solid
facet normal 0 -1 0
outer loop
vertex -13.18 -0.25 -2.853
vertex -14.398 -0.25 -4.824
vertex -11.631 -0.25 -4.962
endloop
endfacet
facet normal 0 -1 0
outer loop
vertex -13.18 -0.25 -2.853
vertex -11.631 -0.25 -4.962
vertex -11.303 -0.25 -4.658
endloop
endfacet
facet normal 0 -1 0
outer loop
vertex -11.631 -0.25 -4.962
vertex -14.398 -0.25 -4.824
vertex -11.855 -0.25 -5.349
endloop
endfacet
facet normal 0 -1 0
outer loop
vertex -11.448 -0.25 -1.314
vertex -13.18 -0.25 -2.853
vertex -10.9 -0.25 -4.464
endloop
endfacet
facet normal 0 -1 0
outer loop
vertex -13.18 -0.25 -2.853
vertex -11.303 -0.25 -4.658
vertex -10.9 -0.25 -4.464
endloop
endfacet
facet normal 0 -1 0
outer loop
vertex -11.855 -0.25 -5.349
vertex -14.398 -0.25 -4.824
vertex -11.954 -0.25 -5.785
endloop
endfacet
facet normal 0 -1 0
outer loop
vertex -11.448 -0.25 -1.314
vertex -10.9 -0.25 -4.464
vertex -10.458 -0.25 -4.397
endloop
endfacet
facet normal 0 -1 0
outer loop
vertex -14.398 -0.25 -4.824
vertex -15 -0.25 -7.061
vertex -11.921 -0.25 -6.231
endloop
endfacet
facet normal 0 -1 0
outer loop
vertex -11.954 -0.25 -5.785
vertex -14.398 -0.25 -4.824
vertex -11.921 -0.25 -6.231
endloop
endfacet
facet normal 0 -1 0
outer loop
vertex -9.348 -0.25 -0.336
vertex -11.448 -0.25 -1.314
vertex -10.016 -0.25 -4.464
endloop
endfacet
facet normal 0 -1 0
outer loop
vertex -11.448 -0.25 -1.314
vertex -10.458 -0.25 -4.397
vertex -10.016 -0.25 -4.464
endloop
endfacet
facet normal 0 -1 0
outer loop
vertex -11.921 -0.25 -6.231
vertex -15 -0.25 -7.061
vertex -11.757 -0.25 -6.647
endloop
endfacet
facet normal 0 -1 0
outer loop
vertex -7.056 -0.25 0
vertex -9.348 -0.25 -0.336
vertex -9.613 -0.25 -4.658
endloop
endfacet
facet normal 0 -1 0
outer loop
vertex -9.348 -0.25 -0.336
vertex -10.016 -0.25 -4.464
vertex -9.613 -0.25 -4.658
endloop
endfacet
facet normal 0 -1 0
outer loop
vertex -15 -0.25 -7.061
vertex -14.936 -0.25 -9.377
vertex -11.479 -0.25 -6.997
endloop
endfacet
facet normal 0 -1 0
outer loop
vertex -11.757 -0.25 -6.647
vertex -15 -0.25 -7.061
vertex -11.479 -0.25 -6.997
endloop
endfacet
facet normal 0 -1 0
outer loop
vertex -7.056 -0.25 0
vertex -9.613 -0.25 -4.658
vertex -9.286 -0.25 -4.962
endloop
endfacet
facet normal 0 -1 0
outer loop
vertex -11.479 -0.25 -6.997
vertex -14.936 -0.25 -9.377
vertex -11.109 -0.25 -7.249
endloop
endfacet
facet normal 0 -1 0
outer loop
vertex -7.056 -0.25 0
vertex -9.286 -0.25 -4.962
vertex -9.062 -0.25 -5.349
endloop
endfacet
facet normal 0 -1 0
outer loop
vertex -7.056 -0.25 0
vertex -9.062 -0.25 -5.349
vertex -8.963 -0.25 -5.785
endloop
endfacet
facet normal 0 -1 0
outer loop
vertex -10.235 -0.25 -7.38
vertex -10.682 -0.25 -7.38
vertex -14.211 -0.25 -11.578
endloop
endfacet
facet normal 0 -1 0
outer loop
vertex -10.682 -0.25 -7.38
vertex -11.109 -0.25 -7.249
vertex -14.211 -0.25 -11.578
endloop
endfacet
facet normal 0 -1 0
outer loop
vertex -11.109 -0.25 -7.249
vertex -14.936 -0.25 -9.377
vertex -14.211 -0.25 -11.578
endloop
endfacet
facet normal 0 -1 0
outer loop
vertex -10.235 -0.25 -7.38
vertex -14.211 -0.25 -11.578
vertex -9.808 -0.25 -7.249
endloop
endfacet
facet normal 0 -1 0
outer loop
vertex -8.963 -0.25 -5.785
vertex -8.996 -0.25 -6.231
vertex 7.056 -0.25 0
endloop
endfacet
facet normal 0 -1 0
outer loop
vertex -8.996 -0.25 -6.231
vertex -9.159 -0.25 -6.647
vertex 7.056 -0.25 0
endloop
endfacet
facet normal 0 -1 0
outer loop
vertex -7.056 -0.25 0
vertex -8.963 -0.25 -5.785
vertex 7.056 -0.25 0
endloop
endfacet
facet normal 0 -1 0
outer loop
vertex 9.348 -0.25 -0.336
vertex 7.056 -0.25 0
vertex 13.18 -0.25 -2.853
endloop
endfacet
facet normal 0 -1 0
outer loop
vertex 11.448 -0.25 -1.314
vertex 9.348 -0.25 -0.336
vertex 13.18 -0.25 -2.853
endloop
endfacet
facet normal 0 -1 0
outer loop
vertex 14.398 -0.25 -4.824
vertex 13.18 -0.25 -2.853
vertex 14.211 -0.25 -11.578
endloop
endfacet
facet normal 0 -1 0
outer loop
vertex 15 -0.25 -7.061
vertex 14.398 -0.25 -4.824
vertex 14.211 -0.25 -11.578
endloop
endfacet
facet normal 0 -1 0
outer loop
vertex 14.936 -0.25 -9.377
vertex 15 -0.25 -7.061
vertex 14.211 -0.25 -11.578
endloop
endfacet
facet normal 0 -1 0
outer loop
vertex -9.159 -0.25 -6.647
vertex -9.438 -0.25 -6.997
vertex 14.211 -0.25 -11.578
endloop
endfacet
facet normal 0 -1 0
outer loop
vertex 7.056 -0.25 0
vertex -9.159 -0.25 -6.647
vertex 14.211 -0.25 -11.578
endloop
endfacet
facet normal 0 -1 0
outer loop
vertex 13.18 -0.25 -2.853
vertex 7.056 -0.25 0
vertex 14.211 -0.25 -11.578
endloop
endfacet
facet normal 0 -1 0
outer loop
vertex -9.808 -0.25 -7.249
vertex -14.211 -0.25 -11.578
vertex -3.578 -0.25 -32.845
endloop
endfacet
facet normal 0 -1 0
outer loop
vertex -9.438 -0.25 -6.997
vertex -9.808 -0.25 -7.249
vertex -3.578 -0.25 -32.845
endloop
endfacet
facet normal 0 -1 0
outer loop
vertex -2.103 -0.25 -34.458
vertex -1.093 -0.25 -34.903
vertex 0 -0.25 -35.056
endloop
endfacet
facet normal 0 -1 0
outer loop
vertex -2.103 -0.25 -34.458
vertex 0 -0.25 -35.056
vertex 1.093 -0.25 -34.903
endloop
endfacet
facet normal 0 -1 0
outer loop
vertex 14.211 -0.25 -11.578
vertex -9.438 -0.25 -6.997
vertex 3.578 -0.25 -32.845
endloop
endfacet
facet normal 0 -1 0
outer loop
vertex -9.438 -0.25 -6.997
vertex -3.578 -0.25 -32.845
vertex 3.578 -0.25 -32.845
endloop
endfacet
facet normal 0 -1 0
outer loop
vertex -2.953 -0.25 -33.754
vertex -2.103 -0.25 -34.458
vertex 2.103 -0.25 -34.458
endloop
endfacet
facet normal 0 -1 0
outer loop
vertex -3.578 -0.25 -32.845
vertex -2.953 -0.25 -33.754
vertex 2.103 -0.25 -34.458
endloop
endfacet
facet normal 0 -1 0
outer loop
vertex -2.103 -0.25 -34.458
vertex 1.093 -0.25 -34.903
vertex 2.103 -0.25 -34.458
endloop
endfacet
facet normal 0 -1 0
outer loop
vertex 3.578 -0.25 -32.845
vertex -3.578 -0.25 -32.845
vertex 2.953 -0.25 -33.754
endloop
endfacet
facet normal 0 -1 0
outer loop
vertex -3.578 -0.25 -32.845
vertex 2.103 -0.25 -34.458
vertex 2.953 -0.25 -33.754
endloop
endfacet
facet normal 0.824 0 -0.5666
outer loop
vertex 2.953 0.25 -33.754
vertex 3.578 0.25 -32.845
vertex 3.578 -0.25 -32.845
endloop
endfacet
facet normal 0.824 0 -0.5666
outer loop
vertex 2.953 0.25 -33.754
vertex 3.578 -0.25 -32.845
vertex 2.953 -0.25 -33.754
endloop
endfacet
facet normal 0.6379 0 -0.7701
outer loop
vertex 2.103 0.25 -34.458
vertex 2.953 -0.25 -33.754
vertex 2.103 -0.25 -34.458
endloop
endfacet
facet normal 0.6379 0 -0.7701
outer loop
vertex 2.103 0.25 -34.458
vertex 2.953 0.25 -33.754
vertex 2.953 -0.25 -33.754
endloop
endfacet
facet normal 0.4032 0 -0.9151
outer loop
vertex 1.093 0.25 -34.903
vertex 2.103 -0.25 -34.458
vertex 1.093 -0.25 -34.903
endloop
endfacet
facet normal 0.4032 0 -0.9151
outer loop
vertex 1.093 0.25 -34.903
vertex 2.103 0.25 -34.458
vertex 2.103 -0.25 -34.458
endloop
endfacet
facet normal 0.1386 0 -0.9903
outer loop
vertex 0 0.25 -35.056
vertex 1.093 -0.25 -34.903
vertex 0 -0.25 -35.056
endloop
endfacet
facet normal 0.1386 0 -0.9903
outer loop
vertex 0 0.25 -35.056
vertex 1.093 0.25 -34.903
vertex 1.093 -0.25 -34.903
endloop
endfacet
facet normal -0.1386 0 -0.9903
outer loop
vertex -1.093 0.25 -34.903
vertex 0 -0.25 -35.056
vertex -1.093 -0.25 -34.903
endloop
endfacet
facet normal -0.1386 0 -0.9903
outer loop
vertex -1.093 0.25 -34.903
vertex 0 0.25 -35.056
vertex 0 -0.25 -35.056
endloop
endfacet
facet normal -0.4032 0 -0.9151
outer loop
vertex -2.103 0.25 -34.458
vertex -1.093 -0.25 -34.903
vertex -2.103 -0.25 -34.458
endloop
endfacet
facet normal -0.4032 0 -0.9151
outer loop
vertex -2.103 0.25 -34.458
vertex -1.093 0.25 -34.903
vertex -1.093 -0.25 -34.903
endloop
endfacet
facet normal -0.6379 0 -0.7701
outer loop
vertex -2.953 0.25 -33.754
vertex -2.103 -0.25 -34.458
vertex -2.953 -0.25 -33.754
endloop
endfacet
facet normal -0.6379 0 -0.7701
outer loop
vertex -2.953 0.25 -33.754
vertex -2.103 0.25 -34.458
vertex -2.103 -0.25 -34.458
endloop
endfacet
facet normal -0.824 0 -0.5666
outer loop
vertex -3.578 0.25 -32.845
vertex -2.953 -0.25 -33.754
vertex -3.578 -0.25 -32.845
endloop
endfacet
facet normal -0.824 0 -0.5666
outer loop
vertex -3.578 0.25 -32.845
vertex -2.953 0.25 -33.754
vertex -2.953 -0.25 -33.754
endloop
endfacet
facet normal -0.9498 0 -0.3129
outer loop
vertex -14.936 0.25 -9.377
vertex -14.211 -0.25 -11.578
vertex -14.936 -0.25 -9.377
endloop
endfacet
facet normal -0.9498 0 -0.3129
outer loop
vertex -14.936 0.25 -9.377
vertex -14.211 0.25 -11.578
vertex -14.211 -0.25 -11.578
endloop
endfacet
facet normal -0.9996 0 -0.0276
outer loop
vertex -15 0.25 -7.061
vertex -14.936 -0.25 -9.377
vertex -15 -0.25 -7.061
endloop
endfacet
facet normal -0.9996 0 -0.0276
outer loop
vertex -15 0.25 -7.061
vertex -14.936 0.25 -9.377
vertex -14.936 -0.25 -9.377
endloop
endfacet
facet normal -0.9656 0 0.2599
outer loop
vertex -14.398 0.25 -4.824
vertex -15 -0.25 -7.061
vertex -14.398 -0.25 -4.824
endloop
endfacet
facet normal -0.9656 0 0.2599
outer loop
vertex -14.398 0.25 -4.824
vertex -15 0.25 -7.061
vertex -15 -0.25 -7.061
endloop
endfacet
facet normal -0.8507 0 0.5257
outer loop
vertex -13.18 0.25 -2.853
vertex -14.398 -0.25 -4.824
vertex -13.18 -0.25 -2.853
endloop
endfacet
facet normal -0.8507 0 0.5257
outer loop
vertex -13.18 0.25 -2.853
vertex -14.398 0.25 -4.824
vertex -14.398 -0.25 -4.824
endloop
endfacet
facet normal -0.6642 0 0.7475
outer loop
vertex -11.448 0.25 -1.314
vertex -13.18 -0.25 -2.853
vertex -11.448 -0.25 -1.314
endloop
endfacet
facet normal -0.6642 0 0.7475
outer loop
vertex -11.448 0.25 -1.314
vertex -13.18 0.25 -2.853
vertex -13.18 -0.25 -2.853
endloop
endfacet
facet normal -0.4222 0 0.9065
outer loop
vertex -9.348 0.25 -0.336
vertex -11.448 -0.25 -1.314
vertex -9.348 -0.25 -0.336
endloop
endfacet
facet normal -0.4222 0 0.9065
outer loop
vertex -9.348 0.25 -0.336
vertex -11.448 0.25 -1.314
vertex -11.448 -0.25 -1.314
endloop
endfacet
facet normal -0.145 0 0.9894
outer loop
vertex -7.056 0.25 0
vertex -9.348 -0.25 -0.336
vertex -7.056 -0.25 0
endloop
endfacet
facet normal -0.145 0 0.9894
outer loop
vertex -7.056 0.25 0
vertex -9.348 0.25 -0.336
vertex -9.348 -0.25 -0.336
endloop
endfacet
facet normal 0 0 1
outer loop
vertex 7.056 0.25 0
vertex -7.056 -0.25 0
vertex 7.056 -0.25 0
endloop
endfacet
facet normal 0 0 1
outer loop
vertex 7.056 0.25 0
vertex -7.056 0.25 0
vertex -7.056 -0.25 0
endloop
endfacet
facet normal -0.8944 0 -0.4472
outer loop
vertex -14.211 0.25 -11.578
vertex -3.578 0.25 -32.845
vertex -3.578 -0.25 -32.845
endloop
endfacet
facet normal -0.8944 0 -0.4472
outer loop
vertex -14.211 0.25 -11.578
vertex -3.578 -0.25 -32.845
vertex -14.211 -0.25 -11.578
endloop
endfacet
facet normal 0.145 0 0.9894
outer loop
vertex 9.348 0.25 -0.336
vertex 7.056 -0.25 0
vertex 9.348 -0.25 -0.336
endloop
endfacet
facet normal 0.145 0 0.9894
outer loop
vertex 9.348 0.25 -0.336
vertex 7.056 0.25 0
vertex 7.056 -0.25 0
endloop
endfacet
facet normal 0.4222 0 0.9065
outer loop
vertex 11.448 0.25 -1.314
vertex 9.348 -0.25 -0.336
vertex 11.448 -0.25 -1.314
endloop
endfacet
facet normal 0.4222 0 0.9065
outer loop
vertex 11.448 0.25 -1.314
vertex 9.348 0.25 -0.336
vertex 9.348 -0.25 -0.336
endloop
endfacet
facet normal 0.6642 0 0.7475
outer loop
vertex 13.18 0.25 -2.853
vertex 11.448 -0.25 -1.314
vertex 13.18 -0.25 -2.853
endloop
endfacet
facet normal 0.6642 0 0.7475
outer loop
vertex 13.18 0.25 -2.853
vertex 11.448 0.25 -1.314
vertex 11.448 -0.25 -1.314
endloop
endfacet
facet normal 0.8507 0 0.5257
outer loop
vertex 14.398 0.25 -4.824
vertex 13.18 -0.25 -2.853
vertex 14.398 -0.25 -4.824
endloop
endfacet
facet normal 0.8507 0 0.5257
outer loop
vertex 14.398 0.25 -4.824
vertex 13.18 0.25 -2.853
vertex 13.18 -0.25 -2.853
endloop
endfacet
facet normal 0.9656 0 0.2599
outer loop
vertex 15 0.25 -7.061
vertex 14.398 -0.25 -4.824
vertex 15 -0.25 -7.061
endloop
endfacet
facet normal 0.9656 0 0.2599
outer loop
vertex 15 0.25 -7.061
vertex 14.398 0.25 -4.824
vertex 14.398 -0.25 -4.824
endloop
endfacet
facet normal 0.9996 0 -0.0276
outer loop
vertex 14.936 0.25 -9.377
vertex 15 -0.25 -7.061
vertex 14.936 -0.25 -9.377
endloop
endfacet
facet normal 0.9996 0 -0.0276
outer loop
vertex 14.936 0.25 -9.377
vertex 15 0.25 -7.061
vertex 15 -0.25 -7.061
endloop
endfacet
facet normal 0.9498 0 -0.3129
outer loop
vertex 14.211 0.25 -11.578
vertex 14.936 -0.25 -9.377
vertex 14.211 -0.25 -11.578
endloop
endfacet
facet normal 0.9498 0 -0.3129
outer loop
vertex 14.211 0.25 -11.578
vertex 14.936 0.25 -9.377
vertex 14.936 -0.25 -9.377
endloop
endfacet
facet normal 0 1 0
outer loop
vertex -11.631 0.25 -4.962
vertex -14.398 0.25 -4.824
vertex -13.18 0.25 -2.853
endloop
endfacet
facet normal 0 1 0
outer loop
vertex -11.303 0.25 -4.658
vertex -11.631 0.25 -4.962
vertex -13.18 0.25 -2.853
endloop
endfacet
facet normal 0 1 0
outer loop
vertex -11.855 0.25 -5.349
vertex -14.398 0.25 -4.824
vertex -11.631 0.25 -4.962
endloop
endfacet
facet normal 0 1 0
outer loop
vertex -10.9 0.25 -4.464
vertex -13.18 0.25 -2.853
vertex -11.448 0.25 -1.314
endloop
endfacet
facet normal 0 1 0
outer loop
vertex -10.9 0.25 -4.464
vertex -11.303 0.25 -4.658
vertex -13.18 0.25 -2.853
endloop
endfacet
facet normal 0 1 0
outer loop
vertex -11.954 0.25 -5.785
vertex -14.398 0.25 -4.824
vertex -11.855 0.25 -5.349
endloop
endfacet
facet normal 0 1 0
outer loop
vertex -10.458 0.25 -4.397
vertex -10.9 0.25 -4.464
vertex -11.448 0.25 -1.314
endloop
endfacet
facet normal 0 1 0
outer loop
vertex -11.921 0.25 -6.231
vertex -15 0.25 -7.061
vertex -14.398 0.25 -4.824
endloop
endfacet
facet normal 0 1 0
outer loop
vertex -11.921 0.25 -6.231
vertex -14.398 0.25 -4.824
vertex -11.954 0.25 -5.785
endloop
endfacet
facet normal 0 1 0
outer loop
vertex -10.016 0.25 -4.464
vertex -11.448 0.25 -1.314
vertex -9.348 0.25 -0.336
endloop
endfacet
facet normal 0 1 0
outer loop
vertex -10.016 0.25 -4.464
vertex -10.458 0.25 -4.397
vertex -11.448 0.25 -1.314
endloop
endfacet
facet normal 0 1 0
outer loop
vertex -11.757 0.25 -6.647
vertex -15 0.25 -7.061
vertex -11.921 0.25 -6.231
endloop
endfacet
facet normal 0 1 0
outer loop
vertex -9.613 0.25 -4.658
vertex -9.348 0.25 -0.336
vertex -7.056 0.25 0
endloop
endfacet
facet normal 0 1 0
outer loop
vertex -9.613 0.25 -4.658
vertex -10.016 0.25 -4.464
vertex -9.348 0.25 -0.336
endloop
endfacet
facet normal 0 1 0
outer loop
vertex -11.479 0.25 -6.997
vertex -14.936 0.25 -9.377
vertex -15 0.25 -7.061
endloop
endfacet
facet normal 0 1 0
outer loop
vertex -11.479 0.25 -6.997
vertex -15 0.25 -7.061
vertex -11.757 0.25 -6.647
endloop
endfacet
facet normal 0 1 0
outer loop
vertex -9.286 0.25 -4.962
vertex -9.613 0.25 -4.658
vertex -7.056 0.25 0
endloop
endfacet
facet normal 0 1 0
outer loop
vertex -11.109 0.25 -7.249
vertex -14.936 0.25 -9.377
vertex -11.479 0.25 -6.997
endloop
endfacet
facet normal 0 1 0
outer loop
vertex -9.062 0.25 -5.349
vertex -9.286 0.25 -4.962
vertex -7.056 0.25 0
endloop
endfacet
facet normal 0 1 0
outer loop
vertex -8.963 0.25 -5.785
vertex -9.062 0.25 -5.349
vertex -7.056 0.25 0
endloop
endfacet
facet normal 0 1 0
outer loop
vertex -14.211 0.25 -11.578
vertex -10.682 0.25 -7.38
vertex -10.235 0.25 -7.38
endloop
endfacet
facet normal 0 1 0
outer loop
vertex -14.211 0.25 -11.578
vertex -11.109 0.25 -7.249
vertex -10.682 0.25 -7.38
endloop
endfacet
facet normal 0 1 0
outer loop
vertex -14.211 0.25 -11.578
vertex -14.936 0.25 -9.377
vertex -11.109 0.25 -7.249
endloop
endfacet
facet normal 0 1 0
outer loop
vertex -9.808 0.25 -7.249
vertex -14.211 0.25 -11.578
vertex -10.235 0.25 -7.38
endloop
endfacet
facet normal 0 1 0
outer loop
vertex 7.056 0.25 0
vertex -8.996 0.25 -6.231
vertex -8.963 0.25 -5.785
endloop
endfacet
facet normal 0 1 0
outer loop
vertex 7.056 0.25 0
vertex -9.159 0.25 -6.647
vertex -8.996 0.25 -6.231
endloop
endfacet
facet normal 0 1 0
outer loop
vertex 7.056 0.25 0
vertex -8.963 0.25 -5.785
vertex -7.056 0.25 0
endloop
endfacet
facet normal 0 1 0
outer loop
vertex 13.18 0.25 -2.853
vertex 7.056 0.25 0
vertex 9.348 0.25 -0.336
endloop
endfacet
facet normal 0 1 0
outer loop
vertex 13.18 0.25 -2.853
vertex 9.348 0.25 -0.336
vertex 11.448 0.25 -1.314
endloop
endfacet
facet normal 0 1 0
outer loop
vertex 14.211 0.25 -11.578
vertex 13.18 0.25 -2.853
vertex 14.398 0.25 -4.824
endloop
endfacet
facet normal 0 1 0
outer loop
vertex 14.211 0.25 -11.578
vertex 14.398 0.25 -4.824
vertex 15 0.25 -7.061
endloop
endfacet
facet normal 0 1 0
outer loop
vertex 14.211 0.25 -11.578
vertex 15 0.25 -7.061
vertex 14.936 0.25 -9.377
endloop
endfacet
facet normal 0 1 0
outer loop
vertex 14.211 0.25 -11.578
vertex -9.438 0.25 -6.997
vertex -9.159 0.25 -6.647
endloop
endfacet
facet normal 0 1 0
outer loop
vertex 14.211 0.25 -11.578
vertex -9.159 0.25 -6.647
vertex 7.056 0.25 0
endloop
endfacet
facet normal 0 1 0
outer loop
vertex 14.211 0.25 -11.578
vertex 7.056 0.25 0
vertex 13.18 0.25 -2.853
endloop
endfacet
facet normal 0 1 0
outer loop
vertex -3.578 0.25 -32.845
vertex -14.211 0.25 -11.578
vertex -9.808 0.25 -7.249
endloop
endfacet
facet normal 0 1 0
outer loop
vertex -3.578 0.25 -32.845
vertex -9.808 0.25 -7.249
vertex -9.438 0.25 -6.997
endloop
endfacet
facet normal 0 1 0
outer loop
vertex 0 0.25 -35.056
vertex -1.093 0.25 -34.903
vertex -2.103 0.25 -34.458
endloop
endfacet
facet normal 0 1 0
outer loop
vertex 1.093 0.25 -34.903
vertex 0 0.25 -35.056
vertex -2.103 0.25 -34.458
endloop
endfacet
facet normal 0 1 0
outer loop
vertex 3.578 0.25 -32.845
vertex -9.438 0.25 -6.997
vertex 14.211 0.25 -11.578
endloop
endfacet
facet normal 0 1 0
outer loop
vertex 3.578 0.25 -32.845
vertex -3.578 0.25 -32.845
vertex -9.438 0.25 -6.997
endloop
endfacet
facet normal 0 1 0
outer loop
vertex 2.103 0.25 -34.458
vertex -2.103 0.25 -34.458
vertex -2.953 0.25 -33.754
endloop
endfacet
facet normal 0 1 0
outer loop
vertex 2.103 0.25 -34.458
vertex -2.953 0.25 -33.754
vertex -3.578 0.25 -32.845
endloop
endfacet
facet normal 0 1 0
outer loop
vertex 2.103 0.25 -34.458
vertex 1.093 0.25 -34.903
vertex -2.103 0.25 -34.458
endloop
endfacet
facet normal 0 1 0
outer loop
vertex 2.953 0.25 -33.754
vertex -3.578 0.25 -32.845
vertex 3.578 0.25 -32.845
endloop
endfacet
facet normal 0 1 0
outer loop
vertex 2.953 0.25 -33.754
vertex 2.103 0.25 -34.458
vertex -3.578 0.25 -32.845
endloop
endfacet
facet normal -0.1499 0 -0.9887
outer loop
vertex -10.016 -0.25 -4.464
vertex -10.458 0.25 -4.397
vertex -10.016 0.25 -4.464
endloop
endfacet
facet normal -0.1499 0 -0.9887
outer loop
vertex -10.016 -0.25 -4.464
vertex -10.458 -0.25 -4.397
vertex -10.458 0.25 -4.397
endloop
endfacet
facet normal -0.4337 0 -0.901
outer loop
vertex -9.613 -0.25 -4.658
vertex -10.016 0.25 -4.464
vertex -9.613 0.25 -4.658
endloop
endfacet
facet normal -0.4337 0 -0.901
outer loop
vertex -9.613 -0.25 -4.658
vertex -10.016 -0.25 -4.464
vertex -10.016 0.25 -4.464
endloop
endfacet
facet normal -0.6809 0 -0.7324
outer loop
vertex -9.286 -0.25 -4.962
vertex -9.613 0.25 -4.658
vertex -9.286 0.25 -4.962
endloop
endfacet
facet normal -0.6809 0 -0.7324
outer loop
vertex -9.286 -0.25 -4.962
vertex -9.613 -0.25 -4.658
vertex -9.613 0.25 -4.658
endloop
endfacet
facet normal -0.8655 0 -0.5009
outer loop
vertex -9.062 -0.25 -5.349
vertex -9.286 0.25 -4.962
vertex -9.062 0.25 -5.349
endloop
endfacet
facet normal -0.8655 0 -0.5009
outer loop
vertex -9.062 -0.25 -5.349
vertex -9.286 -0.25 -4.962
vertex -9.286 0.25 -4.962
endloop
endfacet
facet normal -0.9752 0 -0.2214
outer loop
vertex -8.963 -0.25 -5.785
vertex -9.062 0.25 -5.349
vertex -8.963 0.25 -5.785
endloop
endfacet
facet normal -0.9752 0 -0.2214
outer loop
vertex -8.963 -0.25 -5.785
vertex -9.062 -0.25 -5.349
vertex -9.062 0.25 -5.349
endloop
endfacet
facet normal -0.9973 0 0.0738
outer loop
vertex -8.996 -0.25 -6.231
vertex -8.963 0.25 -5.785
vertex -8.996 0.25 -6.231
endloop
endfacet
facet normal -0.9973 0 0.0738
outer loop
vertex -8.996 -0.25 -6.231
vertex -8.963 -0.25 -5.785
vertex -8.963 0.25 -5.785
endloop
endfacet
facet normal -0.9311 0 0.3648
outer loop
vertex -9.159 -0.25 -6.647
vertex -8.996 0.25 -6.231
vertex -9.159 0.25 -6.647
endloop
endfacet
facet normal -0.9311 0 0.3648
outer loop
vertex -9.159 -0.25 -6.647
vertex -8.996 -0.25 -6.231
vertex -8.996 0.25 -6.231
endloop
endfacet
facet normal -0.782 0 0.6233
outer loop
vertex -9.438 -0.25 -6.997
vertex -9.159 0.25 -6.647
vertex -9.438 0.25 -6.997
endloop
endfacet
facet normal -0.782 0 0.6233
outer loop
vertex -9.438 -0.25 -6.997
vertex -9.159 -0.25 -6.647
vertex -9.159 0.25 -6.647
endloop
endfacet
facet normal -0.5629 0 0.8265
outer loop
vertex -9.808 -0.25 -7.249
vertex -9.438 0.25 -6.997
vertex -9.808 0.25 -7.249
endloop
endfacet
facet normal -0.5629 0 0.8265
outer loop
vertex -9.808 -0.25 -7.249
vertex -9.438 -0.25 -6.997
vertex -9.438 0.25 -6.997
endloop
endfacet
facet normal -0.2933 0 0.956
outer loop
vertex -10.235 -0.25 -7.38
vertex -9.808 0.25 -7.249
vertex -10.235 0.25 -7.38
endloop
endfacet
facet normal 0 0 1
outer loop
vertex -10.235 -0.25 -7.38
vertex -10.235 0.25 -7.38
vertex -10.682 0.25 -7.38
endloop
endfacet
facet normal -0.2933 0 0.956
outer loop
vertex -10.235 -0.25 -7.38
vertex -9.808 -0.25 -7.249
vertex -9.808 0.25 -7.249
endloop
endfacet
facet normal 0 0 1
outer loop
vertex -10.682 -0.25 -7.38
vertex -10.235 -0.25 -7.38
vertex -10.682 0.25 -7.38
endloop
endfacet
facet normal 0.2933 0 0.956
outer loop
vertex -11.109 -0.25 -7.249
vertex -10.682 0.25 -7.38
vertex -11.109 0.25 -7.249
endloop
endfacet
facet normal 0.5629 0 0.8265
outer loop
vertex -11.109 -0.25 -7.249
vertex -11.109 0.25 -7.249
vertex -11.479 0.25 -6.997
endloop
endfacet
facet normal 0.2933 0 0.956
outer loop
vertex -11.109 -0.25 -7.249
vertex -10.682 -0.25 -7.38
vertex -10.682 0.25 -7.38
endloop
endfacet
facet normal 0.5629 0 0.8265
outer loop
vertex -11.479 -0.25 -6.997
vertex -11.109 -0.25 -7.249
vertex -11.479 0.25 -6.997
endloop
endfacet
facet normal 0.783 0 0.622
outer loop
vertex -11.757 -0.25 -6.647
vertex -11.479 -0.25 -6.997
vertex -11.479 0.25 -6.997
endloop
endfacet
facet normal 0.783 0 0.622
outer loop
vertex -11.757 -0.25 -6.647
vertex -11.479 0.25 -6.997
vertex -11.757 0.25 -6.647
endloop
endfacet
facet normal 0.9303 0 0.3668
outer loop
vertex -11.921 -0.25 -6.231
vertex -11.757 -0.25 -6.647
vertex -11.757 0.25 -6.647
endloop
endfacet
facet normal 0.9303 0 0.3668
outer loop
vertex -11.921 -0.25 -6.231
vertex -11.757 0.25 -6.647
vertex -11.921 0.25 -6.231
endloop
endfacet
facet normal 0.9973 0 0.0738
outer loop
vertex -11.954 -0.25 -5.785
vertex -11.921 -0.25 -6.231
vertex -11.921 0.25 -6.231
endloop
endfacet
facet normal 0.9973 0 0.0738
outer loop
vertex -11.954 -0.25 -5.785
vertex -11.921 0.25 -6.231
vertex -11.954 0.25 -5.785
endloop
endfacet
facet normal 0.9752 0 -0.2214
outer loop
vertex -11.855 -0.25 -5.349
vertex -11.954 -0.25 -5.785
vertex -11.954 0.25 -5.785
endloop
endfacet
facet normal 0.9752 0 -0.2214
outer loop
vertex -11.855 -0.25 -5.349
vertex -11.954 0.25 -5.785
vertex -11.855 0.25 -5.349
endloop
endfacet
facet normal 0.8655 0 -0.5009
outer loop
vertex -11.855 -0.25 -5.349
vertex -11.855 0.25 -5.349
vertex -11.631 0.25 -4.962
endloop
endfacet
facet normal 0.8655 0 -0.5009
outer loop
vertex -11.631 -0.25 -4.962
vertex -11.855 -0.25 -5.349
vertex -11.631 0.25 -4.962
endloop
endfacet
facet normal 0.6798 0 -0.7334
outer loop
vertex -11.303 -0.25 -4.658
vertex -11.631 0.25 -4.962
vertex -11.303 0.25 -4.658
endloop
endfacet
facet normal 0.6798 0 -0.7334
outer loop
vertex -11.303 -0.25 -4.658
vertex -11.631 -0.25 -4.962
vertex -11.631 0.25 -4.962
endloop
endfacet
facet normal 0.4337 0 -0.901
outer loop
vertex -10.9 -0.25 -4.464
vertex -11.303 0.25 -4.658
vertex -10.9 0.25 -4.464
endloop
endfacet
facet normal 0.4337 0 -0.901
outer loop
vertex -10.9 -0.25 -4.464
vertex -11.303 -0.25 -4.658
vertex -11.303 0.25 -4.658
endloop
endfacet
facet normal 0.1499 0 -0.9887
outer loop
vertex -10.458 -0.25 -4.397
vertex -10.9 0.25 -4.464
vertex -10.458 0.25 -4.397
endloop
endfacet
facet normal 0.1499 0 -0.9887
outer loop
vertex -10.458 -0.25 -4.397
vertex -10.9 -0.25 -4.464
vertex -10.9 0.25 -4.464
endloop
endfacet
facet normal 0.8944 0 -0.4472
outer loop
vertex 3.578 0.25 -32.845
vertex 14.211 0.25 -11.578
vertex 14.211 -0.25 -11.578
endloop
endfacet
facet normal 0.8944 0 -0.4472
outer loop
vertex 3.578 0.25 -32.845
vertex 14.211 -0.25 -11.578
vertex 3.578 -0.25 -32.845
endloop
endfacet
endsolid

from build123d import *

# Parameters (mm, degrees)
SKETCH1_R           = 1.5
BOSS_EXTRUDE1_DEPTH = 0.25


with BuildPart() as part:
    # Sketch1 → Boss-Extrude1 (new, symmetric)
    with BuildSketch(Plane(origin=(0, 0, 0), x_dir=(1, 0, 0), z_dir=(0, 1, 0))):
        with BuildLine():
            Line((0, 0), (7.05572809, 0))
            ThreePointArc((7.05572809, 0), (13.860934557, 3.794151103), (14.211145618, 11.577708764))
            Line((14.211145618, 11.577708764), (3.577708764, 32.844582472))
            ThreePointArc((3.577708764, 32.844582472), (0, 35.05572809), (-3.577708764, 32.844582472))
            Line((-3.577708764, 32.844582472), (-14.211145618, 11.577708764))
            ThreePointArc((-14.211145618, 11.577708764), (-13.860934557, 3.794151103), (-7.05572809, 0))
            Line((-7.05572809, 0), (0, 0))
        make_face()
        with Locations(Location((-10.458331323, 5.897075552, 0), (0, 0, 270))):
            Circle(SKETCH1_R, mode=Mode.SUBTRACT)
    extrude(amount=BOSS_EXTRUDE1_DEPTH, both=True)


solid = part.part
